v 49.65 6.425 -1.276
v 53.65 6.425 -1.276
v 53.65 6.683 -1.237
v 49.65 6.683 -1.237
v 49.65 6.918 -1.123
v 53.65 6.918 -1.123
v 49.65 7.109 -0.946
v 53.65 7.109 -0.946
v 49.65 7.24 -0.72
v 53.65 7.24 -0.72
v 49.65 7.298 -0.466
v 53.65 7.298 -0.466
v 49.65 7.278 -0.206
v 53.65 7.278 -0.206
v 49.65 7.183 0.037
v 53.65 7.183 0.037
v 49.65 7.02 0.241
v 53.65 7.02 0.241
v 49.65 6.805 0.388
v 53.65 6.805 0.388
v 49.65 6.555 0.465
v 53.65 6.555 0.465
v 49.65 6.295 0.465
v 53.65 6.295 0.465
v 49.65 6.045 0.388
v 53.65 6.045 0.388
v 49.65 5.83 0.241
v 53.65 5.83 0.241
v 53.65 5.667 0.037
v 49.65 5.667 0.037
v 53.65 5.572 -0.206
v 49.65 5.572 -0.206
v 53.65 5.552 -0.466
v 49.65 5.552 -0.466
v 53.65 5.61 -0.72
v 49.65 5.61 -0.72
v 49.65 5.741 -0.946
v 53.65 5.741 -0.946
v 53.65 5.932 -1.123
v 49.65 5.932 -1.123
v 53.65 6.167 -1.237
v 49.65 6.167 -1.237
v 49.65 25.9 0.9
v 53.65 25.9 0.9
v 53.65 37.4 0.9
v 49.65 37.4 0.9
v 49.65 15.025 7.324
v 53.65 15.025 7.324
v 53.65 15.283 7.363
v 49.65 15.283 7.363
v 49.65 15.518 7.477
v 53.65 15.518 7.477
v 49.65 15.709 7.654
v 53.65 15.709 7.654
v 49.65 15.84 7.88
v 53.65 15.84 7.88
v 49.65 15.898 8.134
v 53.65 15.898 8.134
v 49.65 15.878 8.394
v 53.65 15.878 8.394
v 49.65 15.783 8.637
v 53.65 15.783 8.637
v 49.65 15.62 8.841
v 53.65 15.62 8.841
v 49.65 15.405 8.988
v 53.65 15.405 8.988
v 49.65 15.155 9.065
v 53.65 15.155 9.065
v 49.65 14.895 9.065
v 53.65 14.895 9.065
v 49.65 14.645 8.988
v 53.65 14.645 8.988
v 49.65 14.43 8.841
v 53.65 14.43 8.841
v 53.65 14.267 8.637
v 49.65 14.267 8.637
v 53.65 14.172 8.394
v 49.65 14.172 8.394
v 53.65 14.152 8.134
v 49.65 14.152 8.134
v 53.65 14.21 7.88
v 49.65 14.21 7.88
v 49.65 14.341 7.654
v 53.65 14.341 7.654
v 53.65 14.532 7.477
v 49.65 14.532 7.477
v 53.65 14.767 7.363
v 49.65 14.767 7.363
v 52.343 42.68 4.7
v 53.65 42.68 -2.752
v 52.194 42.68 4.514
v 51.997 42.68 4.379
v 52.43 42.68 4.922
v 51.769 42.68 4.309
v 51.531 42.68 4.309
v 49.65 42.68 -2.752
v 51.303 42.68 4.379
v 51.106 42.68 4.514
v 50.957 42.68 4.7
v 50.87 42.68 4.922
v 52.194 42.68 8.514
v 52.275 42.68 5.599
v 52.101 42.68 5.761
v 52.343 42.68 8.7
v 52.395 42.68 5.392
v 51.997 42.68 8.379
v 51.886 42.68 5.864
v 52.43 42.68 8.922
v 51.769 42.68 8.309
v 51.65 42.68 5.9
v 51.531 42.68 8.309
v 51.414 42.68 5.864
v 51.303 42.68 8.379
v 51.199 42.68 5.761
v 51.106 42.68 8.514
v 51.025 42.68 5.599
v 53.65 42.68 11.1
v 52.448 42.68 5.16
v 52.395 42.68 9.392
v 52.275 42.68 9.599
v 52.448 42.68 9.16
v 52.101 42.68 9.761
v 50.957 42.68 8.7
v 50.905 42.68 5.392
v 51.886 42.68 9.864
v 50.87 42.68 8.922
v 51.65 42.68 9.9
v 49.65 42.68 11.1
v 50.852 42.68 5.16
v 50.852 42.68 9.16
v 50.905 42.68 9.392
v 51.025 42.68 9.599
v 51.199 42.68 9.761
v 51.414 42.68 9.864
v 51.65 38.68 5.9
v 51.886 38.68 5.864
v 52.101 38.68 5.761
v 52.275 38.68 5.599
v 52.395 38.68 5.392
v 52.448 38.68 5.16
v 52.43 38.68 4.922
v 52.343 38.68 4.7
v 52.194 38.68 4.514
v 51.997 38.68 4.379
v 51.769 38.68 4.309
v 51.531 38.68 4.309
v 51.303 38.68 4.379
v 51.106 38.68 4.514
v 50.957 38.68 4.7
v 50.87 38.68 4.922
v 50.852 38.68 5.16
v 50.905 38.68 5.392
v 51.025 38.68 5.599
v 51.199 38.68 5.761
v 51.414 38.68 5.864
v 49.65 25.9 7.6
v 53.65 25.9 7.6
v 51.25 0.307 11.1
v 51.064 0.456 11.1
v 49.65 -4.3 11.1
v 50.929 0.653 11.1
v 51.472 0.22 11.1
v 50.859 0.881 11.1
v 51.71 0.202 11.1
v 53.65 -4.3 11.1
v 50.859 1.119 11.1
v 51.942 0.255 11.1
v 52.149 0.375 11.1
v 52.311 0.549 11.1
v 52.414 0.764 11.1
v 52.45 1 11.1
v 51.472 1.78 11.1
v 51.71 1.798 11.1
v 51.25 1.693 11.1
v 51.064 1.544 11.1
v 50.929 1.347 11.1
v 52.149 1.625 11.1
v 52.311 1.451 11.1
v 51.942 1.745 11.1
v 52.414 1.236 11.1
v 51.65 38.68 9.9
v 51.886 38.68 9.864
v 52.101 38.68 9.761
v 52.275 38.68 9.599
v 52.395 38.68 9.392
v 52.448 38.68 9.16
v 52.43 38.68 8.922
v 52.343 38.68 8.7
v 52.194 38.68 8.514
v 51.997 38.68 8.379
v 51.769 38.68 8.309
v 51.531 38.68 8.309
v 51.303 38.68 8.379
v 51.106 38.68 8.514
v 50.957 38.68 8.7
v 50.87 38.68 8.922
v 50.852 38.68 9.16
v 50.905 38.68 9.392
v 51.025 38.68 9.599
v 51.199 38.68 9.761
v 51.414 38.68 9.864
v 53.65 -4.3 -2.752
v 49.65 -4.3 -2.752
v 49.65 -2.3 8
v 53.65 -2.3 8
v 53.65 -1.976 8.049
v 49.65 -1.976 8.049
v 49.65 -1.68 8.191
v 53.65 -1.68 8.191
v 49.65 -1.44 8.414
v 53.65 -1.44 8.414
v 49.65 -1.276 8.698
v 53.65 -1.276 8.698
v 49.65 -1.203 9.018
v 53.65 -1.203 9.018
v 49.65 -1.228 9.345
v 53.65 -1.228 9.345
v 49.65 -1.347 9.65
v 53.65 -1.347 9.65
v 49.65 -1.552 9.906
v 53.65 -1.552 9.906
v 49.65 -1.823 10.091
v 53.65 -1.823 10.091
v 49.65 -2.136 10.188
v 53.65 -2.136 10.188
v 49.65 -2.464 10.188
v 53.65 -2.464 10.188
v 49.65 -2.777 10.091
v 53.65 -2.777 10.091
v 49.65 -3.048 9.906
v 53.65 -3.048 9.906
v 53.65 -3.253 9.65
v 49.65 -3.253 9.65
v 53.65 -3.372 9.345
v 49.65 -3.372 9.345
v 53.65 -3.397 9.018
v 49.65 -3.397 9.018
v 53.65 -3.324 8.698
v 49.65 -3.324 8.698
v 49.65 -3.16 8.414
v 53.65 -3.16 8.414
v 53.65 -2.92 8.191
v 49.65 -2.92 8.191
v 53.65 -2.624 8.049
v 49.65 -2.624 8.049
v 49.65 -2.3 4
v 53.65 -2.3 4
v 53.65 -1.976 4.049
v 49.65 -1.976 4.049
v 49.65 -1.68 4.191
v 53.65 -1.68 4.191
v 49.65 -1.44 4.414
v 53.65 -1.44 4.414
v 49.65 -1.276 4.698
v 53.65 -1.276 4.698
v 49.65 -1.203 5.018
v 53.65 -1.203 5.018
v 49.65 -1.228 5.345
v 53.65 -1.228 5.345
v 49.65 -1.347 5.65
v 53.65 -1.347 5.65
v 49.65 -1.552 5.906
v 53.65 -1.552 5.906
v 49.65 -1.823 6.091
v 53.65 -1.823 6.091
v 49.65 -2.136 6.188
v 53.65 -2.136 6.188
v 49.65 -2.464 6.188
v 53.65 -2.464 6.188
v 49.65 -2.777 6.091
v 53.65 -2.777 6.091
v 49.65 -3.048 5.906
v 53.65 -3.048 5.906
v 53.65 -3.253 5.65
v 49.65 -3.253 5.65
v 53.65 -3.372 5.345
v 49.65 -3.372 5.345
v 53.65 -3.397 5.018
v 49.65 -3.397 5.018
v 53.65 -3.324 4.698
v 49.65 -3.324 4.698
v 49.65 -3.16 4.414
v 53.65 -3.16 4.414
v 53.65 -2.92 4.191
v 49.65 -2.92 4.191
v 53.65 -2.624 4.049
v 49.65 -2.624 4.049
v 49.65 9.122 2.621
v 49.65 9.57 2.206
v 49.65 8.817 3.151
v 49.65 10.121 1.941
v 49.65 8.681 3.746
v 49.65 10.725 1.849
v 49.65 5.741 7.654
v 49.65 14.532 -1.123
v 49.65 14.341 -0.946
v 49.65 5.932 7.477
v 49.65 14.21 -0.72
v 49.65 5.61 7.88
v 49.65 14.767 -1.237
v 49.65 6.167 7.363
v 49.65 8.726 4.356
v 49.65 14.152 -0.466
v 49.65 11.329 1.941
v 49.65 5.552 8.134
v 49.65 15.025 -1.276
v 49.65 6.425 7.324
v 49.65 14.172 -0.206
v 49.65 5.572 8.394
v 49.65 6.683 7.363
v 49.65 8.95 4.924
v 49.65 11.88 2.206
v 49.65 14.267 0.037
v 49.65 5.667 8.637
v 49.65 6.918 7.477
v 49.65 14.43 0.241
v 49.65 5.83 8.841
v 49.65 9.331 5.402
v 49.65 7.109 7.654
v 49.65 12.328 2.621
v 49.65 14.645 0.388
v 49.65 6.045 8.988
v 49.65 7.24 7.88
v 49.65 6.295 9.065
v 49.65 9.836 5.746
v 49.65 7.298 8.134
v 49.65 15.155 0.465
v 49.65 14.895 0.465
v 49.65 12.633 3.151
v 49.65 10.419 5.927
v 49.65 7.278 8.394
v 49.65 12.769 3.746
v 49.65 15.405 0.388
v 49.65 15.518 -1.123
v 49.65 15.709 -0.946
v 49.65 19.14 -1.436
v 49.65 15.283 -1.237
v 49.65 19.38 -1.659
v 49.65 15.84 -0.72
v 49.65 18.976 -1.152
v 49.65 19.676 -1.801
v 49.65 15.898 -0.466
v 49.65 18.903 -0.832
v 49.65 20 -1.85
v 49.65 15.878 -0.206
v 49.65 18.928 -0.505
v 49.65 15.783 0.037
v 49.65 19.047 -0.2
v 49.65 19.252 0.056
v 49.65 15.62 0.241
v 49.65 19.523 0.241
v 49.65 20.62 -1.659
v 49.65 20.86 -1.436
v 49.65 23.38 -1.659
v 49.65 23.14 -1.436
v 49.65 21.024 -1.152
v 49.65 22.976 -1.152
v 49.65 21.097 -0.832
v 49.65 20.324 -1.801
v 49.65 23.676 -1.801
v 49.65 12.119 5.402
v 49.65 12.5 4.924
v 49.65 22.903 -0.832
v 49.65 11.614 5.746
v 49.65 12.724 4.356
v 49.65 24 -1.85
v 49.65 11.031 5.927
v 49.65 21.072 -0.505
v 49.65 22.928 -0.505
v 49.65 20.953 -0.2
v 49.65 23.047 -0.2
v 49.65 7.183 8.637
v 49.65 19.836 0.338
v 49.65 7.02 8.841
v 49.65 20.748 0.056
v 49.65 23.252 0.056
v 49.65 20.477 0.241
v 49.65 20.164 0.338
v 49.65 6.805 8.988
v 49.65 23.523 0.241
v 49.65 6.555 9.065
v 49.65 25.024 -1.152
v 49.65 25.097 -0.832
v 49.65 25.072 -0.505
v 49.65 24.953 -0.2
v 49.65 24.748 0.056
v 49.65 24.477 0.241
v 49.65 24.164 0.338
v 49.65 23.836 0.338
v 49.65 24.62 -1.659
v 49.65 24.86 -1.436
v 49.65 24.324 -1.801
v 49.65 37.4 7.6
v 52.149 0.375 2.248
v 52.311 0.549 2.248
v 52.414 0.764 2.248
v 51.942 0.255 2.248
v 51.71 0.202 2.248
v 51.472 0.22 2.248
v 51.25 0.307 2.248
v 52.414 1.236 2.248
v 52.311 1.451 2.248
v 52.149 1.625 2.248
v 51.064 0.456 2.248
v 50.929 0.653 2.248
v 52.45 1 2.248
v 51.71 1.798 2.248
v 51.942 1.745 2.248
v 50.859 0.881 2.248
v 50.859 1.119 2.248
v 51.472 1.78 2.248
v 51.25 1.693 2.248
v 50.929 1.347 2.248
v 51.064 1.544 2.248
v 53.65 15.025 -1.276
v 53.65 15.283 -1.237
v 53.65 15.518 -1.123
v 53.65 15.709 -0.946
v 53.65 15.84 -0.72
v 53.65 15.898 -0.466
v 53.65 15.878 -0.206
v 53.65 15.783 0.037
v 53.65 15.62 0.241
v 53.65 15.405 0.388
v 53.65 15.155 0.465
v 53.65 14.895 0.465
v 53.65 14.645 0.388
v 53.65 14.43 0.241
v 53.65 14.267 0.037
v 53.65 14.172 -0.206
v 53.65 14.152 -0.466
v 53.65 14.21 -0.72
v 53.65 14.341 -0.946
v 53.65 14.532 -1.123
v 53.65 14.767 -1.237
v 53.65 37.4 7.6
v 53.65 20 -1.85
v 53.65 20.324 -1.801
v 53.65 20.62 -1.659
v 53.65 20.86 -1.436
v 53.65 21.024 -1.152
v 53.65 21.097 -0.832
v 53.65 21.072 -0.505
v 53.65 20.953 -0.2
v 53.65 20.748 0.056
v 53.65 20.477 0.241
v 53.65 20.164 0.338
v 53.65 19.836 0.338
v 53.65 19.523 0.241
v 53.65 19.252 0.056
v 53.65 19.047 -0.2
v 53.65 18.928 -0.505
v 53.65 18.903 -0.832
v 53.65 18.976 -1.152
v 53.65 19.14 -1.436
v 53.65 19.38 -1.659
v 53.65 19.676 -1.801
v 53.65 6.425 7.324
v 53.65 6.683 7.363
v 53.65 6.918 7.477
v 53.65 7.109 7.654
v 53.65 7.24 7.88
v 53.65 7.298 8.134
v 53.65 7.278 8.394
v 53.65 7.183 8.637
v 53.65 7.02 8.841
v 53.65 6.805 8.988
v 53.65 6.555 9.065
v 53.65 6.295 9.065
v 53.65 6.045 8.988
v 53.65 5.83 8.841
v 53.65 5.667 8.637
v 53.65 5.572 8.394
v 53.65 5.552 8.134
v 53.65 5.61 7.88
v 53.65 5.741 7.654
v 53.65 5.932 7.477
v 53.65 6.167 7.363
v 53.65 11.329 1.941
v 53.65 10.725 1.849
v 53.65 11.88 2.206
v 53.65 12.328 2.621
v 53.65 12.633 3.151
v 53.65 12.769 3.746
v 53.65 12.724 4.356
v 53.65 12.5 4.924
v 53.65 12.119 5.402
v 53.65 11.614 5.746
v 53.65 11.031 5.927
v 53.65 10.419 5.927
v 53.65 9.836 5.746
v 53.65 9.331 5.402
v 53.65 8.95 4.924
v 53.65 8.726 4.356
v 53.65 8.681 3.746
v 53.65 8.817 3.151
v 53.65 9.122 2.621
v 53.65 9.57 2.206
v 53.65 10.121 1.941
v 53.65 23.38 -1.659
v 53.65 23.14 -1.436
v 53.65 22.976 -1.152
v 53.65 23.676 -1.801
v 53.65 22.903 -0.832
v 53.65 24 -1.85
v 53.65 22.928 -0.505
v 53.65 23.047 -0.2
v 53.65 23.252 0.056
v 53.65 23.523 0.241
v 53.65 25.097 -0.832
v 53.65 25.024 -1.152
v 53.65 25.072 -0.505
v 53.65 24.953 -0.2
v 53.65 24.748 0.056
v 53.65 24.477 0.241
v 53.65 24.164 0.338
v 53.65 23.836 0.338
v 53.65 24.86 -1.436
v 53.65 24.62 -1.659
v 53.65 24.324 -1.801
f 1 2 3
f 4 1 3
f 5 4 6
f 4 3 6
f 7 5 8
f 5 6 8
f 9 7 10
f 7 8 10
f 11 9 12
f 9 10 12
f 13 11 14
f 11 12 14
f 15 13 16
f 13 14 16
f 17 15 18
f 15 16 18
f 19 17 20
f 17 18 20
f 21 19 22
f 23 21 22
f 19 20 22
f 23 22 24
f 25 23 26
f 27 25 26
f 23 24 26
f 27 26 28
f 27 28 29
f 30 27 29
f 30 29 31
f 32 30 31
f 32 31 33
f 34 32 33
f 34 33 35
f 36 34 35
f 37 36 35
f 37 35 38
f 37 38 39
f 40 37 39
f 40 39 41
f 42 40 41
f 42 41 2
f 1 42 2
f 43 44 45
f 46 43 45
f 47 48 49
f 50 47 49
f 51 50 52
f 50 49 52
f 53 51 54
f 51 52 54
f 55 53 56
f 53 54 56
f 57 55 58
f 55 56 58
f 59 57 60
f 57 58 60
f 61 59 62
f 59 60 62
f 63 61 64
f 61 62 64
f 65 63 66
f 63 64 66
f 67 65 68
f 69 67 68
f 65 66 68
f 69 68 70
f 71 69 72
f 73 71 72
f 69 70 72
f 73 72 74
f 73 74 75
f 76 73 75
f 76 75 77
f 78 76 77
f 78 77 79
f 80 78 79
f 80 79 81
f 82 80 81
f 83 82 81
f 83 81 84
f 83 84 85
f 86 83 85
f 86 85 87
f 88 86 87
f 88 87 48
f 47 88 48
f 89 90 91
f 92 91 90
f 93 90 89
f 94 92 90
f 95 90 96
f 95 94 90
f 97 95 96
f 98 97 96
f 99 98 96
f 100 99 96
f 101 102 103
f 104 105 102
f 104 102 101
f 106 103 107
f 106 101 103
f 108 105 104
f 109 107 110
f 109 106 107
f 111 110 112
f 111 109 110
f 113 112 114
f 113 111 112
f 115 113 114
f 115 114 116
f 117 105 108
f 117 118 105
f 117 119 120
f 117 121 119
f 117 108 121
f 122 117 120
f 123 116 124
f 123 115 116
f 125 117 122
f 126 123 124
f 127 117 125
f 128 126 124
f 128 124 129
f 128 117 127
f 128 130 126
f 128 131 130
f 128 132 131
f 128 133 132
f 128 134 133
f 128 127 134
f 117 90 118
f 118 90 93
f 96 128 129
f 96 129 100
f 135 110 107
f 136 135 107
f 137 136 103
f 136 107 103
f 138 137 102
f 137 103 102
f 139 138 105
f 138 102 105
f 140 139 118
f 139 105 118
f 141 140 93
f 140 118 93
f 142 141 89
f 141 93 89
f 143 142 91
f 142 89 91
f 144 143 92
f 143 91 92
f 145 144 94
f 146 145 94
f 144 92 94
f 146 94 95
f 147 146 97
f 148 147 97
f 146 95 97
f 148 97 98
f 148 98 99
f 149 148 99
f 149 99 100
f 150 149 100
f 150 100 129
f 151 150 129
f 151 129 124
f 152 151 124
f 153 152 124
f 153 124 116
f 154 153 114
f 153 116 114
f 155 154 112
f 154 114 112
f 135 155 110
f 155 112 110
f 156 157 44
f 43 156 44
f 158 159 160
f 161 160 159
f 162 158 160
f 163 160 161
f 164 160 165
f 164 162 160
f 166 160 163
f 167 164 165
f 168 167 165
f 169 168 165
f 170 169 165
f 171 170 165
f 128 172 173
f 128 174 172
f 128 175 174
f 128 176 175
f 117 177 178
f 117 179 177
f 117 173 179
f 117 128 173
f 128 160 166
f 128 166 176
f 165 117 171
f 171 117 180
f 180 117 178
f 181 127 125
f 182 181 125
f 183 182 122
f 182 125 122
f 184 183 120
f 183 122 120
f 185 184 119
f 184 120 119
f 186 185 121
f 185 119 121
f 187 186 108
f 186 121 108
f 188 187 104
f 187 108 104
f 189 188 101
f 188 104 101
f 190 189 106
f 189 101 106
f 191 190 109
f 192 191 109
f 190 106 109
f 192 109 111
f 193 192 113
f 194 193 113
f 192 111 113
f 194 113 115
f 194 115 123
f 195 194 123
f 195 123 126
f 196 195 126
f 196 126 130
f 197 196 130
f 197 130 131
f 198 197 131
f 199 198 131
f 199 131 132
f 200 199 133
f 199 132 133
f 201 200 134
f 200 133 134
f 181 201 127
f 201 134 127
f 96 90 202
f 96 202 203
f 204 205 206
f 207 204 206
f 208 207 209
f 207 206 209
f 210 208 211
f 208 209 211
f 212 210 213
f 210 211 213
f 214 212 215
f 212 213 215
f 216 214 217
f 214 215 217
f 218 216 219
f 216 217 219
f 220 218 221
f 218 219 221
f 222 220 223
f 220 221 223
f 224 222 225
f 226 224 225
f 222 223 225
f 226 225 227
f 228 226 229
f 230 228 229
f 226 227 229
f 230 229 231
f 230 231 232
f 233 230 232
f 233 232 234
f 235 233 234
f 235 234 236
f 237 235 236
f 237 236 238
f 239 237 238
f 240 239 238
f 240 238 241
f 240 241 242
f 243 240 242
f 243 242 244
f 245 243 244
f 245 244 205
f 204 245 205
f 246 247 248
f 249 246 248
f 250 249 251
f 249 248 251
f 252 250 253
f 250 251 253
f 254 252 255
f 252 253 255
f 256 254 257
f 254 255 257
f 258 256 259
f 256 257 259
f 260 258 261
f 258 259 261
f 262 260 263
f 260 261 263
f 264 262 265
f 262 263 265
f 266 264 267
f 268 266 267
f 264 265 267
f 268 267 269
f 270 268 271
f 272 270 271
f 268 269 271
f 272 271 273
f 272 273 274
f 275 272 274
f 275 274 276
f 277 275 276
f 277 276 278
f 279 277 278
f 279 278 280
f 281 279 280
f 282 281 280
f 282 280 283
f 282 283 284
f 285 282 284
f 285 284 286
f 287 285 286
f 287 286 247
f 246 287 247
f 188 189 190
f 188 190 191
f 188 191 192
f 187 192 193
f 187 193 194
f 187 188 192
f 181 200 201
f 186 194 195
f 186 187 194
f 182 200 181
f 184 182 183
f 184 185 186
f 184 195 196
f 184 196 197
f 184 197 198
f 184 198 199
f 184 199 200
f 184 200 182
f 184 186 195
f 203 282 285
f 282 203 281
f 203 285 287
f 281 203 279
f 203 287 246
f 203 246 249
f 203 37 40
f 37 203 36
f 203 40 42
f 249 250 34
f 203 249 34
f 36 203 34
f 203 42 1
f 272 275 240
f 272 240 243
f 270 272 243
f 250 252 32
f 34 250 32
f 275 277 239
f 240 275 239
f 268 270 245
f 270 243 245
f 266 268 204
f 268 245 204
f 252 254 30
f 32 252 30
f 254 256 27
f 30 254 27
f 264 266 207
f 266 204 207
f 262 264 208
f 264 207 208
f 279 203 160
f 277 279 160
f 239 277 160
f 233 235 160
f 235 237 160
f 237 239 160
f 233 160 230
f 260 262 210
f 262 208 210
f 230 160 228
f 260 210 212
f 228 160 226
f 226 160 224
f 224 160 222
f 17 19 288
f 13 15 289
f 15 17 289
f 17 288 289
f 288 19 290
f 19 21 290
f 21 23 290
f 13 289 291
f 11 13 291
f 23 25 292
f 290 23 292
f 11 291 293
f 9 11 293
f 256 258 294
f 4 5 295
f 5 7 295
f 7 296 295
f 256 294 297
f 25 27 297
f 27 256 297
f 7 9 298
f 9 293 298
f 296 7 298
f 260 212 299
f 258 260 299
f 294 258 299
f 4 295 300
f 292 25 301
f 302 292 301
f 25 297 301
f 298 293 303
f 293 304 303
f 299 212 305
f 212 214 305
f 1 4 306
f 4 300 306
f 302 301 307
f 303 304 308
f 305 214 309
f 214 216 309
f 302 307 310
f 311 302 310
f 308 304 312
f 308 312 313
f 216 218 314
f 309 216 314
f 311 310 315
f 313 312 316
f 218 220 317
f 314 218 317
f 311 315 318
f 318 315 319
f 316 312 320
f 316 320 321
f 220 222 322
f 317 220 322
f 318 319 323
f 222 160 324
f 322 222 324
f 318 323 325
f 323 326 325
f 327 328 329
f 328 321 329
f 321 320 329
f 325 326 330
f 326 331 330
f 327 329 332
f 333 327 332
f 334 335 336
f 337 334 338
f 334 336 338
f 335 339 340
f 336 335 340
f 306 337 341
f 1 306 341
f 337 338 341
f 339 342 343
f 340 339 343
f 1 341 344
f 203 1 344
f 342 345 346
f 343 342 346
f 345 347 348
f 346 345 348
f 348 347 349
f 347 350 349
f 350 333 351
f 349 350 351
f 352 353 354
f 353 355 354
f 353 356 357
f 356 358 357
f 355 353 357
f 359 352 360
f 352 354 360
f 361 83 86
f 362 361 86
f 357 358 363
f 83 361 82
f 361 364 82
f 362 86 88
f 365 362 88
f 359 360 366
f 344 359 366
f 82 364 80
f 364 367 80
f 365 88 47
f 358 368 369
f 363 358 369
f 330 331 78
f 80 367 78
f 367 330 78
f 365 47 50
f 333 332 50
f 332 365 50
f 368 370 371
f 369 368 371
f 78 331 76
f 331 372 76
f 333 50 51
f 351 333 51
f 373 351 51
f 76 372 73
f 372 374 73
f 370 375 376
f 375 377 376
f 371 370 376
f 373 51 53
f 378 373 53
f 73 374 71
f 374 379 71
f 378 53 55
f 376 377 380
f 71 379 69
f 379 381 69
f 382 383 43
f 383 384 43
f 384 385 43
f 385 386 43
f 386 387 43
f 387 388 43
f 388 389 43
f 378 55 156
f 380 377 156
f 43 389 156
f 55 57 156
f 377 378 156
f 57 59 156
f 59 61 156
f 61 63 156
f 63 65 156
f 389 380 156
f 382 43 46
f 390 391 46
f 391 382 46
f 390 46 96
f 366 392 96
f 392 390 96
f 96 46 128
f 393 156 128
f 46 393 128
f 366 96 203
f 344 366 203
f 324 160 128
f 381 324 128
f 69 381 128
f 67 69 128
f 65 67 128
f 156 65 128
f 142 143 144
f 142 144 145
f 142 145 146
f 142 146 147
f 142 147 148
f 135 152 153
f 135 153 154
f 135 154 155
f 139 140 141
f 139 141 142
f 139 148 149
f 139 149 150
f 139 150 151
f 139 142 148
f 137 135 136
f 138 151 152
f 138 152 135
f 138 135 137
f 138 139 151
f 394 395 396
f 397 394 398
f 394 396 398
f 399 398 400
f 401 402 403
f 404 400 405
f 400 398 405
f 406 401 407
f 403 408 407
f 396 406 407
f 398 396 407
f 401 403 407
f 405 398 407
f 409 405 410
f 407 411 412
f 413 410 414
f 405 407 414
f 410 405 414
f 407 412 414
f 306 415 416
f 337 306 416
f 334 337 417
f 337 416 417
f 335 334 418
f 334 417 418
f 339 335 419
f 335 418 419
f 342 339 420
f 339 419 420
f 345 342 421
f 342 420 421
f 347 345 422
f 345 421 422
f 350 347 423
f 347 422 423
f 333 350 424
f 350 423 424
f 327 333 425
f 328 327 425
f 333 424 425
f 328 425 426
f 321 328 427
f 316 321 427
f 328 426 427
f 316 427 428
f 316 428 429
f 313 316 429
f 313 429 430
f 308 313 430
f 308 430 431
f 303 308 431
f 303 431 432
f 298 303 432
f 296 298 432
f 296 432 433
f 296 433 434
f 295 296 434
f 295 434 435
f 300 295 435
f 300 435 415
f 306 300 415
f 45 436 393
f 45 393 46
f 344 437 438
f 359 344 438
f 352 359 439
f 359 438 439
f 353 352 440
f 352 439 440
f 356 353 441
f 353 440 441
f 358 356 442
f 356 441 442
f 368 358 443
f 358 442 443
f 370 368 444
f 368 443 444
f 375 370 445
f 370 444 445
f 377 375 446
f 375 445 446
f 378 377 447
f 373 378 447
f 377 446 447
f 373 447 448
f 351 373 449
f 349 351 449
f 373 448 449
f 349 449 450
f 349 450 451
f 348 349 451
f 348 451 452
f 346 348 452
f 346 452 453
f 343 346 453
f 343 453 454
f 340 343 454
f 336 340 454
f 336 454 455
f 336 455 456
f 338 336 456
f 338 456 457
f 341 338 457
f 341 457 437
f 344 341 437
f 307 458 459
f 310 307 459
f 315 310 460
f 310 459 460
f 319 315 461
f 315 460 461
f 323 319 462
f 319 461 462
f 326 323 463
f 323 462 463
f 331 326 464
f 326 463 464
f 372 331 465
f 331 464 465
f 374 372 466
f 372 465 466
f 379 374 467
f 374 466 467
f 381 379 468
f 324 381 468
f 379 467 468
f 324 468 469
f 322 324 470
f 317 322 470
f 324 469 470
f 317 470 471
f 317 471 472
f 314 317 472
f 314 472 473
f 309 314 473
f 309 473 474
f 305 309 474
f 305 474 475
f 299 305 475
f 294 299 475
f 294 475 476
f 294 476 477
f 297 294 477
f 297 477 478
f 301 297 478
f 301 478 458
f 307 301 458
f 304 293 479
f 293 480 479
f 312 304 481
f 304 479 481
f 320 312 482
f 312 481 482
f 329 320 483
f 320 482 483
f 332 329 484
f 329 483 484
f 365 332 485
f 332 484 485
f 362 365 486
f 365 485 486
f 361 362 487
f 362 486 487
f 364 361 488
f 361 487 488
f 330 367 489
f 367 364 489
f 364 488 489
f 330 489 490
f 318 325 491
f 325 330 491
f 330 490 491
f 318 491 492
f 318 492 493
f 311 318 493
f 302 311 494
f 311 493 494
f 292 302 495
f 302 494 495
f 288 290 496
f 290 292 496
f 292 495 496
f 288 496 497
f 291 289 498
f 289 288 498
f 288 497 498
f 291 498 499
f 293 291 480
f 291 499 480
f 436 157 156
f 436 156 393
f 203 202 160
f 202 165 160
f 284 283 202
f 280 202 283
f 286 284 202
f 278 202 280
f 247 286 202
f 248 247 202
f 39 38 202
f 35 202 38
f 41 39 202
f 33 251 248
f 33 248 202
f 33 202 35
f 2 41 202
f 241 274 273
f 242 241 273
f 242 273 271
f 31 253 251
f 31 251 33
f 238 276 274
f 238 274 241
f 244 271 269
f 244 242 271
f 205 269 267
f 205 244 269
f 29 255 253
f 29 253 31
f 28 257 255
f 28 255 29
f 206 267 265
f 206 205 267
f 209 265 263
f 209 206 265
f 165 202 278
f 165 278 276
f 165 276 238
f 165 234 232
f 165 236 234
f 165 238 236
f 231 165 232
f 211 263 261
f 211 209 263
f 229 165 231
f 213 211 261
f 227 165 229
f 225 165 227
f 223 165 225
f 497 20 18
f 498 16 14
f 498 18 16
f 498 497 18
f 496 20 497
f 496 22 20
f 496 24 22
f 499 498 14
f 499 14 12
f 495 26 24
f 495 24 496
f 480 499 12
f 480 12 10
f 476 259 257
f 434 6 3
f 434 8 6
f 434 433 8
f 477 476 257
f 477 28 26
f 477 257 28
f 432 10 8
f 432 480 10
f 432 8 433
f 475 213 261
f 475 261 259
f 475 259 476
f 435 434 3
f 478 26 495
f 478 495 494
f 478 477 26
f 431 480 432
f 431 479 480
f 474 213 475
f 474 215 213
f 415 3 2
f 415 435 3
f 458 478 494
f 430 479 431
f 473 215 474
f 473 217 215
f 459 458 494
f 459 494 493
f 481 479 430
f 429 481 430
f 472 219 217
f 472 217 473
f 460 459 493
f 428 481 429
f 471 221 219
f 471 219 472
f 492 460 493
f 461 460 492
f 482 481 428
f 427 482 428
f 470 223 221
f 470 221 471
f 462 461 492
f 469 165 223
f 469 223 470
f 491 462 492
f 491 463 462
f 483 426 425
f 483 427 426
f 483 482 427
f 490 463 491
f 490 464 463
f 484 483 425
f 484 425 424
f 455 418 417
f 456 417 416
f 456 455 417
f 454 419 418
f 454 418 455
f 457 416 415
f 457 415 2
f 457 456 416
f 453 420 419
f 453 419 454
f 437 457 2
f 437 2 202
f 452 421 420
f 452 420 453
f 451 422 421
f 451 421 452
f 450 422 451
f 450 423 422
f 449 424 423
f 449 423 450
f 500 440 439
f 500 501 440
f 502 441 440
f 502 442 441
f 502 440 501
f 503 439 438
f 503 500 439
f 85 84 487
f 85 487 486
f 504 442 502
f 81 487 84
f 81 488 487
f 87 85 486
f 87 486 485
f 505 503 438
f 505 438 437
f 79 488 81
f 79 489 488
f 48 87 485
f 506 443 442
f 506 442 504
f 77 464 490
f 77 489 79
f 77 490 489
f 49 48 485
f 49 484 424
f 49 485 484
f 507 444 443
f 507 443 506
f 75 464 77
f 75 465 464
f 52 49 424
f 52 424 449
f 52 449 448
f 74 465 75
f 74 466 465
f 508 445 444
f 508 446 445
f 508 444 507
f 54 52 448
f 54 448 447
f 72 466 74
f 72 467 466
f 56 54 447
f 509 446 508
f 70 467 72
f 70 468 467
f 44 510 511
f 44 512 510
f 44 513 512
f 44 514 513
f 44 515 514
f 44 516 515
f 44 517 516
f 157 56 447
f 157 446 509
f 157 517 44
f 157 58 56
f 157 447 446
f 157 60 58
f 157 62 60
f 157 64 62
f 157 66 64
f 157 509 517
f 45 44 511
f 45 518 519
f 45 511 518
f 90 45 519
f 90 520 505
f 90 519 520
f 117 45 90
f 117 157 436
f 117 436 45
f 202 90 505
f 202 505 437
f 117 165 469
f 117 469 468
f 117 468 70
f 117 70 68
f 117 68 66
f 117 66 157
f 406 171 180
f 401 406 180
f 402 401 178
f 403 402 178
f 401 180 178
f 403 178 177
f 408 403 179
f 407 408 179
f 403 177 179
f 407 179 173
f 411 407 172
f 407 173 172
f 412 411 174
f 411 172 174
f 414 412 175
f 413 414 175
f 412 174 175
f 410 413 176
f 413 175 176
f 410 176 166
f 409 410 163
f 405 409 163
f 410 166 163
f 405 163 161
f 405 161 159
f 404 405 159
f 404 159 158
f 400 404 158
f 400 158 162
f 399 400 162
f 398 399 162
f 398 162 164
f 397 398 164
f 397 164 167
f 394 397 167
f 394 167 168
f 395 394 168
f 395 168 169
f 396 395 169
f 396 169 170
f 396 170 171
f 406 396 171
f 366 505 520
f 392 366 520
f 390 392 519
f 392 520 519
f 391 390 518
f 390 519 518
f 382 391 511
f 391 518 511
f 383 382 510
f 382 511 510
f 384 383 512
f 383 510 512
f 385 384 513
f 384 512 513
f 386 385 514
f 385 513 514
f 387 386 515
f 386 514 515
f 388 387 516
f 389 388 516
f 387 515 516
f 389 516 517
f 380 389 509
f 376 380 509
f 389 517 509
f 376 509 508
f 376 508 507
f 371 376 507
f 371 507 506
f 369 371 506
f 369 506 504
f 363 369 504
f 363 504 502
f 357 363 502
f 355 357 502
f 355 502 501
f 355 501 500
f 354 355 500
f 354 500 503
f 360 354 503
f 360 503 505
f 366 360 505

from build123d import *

# Parameters (mm, degrees)
MAIN_STOCK_START                   = 2.248090434
SKETCH_1_W                         = 4
SKETCH_1_H                         = 46.98
MAIN_STOCK_DEPTH                   = 8.851909566
SKETCH_2_R                         = 0.8
FRAME_1XD1P6_THROUGH_DEPTH         = 70.124968014
SKETCH_3_R                         = 2.05
SMA_CENTER_D4P1_DEPTH              = 4
SKETCH_4_R                         = 0.875
SMA_UPPER_2XD1P75_THROUGH_DEPTH    = 45.280835584
SKETCH_5_W                         = 6.7
SKETCH_5_H                         = 11.5
TYPEC_WINDOW_11P5X6P7_DEPTH        = 4
SKETCH_6_R                         = 1.1
CORNER_FRONT_2XD2P2_THROUGH_DEPTH  = 45.280835584
SKETCH_7_R                         = 0.8
CORNER_REAR_2XD1P6_BLIND4_DEPTH    = 4
SKETCH_8_W                         = 4
SKETCH_8_H                         = 46.98
WALL_EXTENSION_TO_FLOOR_DEPTH      = 5
SKETCH_9_R                         = 2.05
SMA_CENTER_FULL_BORE_DEPTH         = 4.01
SKETCH_10_R                        = 0.875
SMA_LOWER_M2P2_THROUGH_DEPTH       = 4.01
SKETCH_11_W                        = 6.7
SKETCH_11_H                        = 11.5
RIGHT_WINDOW_FULL_11P5X6P7_DEPTH   = 4.01
SKETCH_12_R                        = 1.1
HORIZONTAL_BASE_M2_0_0_05365_DEPTH = 4.01


with BuildPart() as part:
    # 草图1 → Main_Stock (new body)
    with BuildSketch(Plane.XY.offset(MAIN_STOCK_START)):
        with Locations((51.65, 19.19)):
            Rectangle(SKETCH_1_W, SKETCH_1_H)
    extrude(amount=MAIN_STOCK_DEPTH)

    # 草图2 → Frame_1xD1p6_Through (cut, through all)
    with BuildSketch(Plane.XY.offset(11.1)):
        with Locations((51.65, 1)):
            Circle(SKETCH_2_R)
    extrude(amount=-FRAME_1XD1P6_THROUGH_DEPTH, mode=Mode.SUBTRACT)

    # 草图3 → SMA_Center_D4p1 (cut)
    with BuildSketch(Plane(origin=(53.65, 0, 0), x_dir=(0, 0, -1), z_dir=(1, 0, 0))):
        with Locations((-3.899496327, 10.725)):
            Circle(SKETCH_3_R)
    extrude(amount=-SMA_CENTER_D4P1_DEPTH, mode=Mode.SUBTRACT)

    # 草图4 → SMA_Upper_2xD1p75_Through (cut, through all)
    with BuildSketch(Plane(origin=(53.65, 0, 0), x_dir=(0, 0, -1), z_dir=(1, 0, 0))):
        with Locations((-8.199496327, 6.425)):
            Circle(SKETCH_4_R)
        with Locations((-8.199496327, 15.025)):
            Circle(SKETCH_4_R)
    extrude(amount=-SMA_UPPER_2XD1P75_THROUGH_DEPTH, mode=Mode.SUBTRACT)

    # 草图5 → TypeC_Window_11p5x6p7 (cut)
    with BuildSketch(Plane(origin=(53.65, 0, 0), x_dir=(0, 0, -1), z_dir=(1, 0, 0))):
        with Locations((-4.25, 31.65)):
            Rectangle(SKETCH_5_W, SKETCH_5_H)
    extrude(amount=-TYPEC_WINDOW_11P5X6P7_DEPTH, mode=Mode.SUBTRACT)

    # 草图6 → Corner_Front_2xD2p2_Through (cut, through all)
    with BuildSketch(Plane(origin=(53.65, 0, 0), x_dir=(0, 0, -1), z_dir=(1, 0, 0))):
        with Locations((-5.1, -2.3)):
            Circle(SKETCH_6_R)
        with Locations((-9.1, -2.3)):
            Circle(SKETCH_6_R)
    extrude(amount=-CORNER_FRONT_2XD2P2_THROUGH_DEPTH, mode=Mode.SUBTRACT)

    # 草图7 → Corner_Rear_2xD1p6_Blind4 (cut)
    with BuildSketch(Plane(origin=(0, 42.68, 0), x_dir=(1, 0, 0), z_dir=(0, 1, 0))):
        with Locations(Location((51.65, -5.1, 0), (0, 0, 270))):
            Circle(SKETCH_7_R)
        with Locations(Location((51.65, -9.1, 0), (0, 0, 270))):
            Circle(SKETCH_7_R)
    extrude(amount=-CORNER_REAR_2XD1P6_BLIND4_DEPTH, mode=Mode.SUBTRACT)

    # 草图8 → Wall_Extension_To_Floor (add)
    with BuildSketch(Plane(origin=(0, 0, 2.248090434), x_dir=(-1, 0, 0), z_dir=(0, 0, -1))):
        with Locations((-51.65, 19.19)):
            Rectangle(SKETCH_8_W, SKETCH_8_H)
    extrude(amount=WALL_EXTENSION_TO_FLOOR_DEPTH)

    # 草图9 → SMA_Center_Full_Bore (cut)
    with BuildSketch(Plane(origin=(53.65, 0, 0), x_dir=(0, 0, -1), z_dir=(1, 0, 0))):
        with Locations((-3.899496327, 10.725)):
            Circle(SKETCH_9_R)
    extrude(amount=-SMA_CENTER_FULL_BORE_DEPTH, mode=Mode.SUBTRACT)

    # 草图10 → SMA_Lower_M2p2_Through (cut)
    with BuildSketch(Plane(origin=(53.65, 0, 0), x_dir=(0, 0, -1), z_dir=(1, 0, 0))):
        with Locations((0.400503673, 6.425)):
            Circle(SKETCH_10_R)
        with Locations((0.400503673, 15.025)):
            Circle(SKETCH_10_R)
    extrude(amount=-SMA_LOWER_M2P2_THROUGH_DEPTH, mode=Mode.SUBTRACT)

    # 草图11 → Right_Window_Full_11p5x6p7 (cut)
    with BuildSketch(Plane(origin=(53.65, 0, 0), x_dir=(0, 0, -1), z_dir=(1, 0, 0))):
        with Locations((-4.25, 31.65)):
            Rectangle(SKETCH_11_W, SKETCH_11_H)
    extrude(amount=-RIGHT_WINDOW_FULL_11P5X6P7_DEPTH, mode=Mode.SUBTRACT)

    # 草图12 → Horizontal_Base_M2_0_0.05365 (cut)
    with BuildSketch(Plane(origin=(53.65, 0, 0), x_dir=(0, 0, -1), z_dir=(1, 0, 0))):
        with Locations((0.75, 20)):
            Circle(SKETCH_12_R)
        with Locations((0.75, 24)):
            Circle(SKETCH_12_R)
    extrude(amount=-HORIZONTAL_BASE_M2_0_0_05365_DEPTH, mode=Mode.SUBTRACT)


solid = part.part
